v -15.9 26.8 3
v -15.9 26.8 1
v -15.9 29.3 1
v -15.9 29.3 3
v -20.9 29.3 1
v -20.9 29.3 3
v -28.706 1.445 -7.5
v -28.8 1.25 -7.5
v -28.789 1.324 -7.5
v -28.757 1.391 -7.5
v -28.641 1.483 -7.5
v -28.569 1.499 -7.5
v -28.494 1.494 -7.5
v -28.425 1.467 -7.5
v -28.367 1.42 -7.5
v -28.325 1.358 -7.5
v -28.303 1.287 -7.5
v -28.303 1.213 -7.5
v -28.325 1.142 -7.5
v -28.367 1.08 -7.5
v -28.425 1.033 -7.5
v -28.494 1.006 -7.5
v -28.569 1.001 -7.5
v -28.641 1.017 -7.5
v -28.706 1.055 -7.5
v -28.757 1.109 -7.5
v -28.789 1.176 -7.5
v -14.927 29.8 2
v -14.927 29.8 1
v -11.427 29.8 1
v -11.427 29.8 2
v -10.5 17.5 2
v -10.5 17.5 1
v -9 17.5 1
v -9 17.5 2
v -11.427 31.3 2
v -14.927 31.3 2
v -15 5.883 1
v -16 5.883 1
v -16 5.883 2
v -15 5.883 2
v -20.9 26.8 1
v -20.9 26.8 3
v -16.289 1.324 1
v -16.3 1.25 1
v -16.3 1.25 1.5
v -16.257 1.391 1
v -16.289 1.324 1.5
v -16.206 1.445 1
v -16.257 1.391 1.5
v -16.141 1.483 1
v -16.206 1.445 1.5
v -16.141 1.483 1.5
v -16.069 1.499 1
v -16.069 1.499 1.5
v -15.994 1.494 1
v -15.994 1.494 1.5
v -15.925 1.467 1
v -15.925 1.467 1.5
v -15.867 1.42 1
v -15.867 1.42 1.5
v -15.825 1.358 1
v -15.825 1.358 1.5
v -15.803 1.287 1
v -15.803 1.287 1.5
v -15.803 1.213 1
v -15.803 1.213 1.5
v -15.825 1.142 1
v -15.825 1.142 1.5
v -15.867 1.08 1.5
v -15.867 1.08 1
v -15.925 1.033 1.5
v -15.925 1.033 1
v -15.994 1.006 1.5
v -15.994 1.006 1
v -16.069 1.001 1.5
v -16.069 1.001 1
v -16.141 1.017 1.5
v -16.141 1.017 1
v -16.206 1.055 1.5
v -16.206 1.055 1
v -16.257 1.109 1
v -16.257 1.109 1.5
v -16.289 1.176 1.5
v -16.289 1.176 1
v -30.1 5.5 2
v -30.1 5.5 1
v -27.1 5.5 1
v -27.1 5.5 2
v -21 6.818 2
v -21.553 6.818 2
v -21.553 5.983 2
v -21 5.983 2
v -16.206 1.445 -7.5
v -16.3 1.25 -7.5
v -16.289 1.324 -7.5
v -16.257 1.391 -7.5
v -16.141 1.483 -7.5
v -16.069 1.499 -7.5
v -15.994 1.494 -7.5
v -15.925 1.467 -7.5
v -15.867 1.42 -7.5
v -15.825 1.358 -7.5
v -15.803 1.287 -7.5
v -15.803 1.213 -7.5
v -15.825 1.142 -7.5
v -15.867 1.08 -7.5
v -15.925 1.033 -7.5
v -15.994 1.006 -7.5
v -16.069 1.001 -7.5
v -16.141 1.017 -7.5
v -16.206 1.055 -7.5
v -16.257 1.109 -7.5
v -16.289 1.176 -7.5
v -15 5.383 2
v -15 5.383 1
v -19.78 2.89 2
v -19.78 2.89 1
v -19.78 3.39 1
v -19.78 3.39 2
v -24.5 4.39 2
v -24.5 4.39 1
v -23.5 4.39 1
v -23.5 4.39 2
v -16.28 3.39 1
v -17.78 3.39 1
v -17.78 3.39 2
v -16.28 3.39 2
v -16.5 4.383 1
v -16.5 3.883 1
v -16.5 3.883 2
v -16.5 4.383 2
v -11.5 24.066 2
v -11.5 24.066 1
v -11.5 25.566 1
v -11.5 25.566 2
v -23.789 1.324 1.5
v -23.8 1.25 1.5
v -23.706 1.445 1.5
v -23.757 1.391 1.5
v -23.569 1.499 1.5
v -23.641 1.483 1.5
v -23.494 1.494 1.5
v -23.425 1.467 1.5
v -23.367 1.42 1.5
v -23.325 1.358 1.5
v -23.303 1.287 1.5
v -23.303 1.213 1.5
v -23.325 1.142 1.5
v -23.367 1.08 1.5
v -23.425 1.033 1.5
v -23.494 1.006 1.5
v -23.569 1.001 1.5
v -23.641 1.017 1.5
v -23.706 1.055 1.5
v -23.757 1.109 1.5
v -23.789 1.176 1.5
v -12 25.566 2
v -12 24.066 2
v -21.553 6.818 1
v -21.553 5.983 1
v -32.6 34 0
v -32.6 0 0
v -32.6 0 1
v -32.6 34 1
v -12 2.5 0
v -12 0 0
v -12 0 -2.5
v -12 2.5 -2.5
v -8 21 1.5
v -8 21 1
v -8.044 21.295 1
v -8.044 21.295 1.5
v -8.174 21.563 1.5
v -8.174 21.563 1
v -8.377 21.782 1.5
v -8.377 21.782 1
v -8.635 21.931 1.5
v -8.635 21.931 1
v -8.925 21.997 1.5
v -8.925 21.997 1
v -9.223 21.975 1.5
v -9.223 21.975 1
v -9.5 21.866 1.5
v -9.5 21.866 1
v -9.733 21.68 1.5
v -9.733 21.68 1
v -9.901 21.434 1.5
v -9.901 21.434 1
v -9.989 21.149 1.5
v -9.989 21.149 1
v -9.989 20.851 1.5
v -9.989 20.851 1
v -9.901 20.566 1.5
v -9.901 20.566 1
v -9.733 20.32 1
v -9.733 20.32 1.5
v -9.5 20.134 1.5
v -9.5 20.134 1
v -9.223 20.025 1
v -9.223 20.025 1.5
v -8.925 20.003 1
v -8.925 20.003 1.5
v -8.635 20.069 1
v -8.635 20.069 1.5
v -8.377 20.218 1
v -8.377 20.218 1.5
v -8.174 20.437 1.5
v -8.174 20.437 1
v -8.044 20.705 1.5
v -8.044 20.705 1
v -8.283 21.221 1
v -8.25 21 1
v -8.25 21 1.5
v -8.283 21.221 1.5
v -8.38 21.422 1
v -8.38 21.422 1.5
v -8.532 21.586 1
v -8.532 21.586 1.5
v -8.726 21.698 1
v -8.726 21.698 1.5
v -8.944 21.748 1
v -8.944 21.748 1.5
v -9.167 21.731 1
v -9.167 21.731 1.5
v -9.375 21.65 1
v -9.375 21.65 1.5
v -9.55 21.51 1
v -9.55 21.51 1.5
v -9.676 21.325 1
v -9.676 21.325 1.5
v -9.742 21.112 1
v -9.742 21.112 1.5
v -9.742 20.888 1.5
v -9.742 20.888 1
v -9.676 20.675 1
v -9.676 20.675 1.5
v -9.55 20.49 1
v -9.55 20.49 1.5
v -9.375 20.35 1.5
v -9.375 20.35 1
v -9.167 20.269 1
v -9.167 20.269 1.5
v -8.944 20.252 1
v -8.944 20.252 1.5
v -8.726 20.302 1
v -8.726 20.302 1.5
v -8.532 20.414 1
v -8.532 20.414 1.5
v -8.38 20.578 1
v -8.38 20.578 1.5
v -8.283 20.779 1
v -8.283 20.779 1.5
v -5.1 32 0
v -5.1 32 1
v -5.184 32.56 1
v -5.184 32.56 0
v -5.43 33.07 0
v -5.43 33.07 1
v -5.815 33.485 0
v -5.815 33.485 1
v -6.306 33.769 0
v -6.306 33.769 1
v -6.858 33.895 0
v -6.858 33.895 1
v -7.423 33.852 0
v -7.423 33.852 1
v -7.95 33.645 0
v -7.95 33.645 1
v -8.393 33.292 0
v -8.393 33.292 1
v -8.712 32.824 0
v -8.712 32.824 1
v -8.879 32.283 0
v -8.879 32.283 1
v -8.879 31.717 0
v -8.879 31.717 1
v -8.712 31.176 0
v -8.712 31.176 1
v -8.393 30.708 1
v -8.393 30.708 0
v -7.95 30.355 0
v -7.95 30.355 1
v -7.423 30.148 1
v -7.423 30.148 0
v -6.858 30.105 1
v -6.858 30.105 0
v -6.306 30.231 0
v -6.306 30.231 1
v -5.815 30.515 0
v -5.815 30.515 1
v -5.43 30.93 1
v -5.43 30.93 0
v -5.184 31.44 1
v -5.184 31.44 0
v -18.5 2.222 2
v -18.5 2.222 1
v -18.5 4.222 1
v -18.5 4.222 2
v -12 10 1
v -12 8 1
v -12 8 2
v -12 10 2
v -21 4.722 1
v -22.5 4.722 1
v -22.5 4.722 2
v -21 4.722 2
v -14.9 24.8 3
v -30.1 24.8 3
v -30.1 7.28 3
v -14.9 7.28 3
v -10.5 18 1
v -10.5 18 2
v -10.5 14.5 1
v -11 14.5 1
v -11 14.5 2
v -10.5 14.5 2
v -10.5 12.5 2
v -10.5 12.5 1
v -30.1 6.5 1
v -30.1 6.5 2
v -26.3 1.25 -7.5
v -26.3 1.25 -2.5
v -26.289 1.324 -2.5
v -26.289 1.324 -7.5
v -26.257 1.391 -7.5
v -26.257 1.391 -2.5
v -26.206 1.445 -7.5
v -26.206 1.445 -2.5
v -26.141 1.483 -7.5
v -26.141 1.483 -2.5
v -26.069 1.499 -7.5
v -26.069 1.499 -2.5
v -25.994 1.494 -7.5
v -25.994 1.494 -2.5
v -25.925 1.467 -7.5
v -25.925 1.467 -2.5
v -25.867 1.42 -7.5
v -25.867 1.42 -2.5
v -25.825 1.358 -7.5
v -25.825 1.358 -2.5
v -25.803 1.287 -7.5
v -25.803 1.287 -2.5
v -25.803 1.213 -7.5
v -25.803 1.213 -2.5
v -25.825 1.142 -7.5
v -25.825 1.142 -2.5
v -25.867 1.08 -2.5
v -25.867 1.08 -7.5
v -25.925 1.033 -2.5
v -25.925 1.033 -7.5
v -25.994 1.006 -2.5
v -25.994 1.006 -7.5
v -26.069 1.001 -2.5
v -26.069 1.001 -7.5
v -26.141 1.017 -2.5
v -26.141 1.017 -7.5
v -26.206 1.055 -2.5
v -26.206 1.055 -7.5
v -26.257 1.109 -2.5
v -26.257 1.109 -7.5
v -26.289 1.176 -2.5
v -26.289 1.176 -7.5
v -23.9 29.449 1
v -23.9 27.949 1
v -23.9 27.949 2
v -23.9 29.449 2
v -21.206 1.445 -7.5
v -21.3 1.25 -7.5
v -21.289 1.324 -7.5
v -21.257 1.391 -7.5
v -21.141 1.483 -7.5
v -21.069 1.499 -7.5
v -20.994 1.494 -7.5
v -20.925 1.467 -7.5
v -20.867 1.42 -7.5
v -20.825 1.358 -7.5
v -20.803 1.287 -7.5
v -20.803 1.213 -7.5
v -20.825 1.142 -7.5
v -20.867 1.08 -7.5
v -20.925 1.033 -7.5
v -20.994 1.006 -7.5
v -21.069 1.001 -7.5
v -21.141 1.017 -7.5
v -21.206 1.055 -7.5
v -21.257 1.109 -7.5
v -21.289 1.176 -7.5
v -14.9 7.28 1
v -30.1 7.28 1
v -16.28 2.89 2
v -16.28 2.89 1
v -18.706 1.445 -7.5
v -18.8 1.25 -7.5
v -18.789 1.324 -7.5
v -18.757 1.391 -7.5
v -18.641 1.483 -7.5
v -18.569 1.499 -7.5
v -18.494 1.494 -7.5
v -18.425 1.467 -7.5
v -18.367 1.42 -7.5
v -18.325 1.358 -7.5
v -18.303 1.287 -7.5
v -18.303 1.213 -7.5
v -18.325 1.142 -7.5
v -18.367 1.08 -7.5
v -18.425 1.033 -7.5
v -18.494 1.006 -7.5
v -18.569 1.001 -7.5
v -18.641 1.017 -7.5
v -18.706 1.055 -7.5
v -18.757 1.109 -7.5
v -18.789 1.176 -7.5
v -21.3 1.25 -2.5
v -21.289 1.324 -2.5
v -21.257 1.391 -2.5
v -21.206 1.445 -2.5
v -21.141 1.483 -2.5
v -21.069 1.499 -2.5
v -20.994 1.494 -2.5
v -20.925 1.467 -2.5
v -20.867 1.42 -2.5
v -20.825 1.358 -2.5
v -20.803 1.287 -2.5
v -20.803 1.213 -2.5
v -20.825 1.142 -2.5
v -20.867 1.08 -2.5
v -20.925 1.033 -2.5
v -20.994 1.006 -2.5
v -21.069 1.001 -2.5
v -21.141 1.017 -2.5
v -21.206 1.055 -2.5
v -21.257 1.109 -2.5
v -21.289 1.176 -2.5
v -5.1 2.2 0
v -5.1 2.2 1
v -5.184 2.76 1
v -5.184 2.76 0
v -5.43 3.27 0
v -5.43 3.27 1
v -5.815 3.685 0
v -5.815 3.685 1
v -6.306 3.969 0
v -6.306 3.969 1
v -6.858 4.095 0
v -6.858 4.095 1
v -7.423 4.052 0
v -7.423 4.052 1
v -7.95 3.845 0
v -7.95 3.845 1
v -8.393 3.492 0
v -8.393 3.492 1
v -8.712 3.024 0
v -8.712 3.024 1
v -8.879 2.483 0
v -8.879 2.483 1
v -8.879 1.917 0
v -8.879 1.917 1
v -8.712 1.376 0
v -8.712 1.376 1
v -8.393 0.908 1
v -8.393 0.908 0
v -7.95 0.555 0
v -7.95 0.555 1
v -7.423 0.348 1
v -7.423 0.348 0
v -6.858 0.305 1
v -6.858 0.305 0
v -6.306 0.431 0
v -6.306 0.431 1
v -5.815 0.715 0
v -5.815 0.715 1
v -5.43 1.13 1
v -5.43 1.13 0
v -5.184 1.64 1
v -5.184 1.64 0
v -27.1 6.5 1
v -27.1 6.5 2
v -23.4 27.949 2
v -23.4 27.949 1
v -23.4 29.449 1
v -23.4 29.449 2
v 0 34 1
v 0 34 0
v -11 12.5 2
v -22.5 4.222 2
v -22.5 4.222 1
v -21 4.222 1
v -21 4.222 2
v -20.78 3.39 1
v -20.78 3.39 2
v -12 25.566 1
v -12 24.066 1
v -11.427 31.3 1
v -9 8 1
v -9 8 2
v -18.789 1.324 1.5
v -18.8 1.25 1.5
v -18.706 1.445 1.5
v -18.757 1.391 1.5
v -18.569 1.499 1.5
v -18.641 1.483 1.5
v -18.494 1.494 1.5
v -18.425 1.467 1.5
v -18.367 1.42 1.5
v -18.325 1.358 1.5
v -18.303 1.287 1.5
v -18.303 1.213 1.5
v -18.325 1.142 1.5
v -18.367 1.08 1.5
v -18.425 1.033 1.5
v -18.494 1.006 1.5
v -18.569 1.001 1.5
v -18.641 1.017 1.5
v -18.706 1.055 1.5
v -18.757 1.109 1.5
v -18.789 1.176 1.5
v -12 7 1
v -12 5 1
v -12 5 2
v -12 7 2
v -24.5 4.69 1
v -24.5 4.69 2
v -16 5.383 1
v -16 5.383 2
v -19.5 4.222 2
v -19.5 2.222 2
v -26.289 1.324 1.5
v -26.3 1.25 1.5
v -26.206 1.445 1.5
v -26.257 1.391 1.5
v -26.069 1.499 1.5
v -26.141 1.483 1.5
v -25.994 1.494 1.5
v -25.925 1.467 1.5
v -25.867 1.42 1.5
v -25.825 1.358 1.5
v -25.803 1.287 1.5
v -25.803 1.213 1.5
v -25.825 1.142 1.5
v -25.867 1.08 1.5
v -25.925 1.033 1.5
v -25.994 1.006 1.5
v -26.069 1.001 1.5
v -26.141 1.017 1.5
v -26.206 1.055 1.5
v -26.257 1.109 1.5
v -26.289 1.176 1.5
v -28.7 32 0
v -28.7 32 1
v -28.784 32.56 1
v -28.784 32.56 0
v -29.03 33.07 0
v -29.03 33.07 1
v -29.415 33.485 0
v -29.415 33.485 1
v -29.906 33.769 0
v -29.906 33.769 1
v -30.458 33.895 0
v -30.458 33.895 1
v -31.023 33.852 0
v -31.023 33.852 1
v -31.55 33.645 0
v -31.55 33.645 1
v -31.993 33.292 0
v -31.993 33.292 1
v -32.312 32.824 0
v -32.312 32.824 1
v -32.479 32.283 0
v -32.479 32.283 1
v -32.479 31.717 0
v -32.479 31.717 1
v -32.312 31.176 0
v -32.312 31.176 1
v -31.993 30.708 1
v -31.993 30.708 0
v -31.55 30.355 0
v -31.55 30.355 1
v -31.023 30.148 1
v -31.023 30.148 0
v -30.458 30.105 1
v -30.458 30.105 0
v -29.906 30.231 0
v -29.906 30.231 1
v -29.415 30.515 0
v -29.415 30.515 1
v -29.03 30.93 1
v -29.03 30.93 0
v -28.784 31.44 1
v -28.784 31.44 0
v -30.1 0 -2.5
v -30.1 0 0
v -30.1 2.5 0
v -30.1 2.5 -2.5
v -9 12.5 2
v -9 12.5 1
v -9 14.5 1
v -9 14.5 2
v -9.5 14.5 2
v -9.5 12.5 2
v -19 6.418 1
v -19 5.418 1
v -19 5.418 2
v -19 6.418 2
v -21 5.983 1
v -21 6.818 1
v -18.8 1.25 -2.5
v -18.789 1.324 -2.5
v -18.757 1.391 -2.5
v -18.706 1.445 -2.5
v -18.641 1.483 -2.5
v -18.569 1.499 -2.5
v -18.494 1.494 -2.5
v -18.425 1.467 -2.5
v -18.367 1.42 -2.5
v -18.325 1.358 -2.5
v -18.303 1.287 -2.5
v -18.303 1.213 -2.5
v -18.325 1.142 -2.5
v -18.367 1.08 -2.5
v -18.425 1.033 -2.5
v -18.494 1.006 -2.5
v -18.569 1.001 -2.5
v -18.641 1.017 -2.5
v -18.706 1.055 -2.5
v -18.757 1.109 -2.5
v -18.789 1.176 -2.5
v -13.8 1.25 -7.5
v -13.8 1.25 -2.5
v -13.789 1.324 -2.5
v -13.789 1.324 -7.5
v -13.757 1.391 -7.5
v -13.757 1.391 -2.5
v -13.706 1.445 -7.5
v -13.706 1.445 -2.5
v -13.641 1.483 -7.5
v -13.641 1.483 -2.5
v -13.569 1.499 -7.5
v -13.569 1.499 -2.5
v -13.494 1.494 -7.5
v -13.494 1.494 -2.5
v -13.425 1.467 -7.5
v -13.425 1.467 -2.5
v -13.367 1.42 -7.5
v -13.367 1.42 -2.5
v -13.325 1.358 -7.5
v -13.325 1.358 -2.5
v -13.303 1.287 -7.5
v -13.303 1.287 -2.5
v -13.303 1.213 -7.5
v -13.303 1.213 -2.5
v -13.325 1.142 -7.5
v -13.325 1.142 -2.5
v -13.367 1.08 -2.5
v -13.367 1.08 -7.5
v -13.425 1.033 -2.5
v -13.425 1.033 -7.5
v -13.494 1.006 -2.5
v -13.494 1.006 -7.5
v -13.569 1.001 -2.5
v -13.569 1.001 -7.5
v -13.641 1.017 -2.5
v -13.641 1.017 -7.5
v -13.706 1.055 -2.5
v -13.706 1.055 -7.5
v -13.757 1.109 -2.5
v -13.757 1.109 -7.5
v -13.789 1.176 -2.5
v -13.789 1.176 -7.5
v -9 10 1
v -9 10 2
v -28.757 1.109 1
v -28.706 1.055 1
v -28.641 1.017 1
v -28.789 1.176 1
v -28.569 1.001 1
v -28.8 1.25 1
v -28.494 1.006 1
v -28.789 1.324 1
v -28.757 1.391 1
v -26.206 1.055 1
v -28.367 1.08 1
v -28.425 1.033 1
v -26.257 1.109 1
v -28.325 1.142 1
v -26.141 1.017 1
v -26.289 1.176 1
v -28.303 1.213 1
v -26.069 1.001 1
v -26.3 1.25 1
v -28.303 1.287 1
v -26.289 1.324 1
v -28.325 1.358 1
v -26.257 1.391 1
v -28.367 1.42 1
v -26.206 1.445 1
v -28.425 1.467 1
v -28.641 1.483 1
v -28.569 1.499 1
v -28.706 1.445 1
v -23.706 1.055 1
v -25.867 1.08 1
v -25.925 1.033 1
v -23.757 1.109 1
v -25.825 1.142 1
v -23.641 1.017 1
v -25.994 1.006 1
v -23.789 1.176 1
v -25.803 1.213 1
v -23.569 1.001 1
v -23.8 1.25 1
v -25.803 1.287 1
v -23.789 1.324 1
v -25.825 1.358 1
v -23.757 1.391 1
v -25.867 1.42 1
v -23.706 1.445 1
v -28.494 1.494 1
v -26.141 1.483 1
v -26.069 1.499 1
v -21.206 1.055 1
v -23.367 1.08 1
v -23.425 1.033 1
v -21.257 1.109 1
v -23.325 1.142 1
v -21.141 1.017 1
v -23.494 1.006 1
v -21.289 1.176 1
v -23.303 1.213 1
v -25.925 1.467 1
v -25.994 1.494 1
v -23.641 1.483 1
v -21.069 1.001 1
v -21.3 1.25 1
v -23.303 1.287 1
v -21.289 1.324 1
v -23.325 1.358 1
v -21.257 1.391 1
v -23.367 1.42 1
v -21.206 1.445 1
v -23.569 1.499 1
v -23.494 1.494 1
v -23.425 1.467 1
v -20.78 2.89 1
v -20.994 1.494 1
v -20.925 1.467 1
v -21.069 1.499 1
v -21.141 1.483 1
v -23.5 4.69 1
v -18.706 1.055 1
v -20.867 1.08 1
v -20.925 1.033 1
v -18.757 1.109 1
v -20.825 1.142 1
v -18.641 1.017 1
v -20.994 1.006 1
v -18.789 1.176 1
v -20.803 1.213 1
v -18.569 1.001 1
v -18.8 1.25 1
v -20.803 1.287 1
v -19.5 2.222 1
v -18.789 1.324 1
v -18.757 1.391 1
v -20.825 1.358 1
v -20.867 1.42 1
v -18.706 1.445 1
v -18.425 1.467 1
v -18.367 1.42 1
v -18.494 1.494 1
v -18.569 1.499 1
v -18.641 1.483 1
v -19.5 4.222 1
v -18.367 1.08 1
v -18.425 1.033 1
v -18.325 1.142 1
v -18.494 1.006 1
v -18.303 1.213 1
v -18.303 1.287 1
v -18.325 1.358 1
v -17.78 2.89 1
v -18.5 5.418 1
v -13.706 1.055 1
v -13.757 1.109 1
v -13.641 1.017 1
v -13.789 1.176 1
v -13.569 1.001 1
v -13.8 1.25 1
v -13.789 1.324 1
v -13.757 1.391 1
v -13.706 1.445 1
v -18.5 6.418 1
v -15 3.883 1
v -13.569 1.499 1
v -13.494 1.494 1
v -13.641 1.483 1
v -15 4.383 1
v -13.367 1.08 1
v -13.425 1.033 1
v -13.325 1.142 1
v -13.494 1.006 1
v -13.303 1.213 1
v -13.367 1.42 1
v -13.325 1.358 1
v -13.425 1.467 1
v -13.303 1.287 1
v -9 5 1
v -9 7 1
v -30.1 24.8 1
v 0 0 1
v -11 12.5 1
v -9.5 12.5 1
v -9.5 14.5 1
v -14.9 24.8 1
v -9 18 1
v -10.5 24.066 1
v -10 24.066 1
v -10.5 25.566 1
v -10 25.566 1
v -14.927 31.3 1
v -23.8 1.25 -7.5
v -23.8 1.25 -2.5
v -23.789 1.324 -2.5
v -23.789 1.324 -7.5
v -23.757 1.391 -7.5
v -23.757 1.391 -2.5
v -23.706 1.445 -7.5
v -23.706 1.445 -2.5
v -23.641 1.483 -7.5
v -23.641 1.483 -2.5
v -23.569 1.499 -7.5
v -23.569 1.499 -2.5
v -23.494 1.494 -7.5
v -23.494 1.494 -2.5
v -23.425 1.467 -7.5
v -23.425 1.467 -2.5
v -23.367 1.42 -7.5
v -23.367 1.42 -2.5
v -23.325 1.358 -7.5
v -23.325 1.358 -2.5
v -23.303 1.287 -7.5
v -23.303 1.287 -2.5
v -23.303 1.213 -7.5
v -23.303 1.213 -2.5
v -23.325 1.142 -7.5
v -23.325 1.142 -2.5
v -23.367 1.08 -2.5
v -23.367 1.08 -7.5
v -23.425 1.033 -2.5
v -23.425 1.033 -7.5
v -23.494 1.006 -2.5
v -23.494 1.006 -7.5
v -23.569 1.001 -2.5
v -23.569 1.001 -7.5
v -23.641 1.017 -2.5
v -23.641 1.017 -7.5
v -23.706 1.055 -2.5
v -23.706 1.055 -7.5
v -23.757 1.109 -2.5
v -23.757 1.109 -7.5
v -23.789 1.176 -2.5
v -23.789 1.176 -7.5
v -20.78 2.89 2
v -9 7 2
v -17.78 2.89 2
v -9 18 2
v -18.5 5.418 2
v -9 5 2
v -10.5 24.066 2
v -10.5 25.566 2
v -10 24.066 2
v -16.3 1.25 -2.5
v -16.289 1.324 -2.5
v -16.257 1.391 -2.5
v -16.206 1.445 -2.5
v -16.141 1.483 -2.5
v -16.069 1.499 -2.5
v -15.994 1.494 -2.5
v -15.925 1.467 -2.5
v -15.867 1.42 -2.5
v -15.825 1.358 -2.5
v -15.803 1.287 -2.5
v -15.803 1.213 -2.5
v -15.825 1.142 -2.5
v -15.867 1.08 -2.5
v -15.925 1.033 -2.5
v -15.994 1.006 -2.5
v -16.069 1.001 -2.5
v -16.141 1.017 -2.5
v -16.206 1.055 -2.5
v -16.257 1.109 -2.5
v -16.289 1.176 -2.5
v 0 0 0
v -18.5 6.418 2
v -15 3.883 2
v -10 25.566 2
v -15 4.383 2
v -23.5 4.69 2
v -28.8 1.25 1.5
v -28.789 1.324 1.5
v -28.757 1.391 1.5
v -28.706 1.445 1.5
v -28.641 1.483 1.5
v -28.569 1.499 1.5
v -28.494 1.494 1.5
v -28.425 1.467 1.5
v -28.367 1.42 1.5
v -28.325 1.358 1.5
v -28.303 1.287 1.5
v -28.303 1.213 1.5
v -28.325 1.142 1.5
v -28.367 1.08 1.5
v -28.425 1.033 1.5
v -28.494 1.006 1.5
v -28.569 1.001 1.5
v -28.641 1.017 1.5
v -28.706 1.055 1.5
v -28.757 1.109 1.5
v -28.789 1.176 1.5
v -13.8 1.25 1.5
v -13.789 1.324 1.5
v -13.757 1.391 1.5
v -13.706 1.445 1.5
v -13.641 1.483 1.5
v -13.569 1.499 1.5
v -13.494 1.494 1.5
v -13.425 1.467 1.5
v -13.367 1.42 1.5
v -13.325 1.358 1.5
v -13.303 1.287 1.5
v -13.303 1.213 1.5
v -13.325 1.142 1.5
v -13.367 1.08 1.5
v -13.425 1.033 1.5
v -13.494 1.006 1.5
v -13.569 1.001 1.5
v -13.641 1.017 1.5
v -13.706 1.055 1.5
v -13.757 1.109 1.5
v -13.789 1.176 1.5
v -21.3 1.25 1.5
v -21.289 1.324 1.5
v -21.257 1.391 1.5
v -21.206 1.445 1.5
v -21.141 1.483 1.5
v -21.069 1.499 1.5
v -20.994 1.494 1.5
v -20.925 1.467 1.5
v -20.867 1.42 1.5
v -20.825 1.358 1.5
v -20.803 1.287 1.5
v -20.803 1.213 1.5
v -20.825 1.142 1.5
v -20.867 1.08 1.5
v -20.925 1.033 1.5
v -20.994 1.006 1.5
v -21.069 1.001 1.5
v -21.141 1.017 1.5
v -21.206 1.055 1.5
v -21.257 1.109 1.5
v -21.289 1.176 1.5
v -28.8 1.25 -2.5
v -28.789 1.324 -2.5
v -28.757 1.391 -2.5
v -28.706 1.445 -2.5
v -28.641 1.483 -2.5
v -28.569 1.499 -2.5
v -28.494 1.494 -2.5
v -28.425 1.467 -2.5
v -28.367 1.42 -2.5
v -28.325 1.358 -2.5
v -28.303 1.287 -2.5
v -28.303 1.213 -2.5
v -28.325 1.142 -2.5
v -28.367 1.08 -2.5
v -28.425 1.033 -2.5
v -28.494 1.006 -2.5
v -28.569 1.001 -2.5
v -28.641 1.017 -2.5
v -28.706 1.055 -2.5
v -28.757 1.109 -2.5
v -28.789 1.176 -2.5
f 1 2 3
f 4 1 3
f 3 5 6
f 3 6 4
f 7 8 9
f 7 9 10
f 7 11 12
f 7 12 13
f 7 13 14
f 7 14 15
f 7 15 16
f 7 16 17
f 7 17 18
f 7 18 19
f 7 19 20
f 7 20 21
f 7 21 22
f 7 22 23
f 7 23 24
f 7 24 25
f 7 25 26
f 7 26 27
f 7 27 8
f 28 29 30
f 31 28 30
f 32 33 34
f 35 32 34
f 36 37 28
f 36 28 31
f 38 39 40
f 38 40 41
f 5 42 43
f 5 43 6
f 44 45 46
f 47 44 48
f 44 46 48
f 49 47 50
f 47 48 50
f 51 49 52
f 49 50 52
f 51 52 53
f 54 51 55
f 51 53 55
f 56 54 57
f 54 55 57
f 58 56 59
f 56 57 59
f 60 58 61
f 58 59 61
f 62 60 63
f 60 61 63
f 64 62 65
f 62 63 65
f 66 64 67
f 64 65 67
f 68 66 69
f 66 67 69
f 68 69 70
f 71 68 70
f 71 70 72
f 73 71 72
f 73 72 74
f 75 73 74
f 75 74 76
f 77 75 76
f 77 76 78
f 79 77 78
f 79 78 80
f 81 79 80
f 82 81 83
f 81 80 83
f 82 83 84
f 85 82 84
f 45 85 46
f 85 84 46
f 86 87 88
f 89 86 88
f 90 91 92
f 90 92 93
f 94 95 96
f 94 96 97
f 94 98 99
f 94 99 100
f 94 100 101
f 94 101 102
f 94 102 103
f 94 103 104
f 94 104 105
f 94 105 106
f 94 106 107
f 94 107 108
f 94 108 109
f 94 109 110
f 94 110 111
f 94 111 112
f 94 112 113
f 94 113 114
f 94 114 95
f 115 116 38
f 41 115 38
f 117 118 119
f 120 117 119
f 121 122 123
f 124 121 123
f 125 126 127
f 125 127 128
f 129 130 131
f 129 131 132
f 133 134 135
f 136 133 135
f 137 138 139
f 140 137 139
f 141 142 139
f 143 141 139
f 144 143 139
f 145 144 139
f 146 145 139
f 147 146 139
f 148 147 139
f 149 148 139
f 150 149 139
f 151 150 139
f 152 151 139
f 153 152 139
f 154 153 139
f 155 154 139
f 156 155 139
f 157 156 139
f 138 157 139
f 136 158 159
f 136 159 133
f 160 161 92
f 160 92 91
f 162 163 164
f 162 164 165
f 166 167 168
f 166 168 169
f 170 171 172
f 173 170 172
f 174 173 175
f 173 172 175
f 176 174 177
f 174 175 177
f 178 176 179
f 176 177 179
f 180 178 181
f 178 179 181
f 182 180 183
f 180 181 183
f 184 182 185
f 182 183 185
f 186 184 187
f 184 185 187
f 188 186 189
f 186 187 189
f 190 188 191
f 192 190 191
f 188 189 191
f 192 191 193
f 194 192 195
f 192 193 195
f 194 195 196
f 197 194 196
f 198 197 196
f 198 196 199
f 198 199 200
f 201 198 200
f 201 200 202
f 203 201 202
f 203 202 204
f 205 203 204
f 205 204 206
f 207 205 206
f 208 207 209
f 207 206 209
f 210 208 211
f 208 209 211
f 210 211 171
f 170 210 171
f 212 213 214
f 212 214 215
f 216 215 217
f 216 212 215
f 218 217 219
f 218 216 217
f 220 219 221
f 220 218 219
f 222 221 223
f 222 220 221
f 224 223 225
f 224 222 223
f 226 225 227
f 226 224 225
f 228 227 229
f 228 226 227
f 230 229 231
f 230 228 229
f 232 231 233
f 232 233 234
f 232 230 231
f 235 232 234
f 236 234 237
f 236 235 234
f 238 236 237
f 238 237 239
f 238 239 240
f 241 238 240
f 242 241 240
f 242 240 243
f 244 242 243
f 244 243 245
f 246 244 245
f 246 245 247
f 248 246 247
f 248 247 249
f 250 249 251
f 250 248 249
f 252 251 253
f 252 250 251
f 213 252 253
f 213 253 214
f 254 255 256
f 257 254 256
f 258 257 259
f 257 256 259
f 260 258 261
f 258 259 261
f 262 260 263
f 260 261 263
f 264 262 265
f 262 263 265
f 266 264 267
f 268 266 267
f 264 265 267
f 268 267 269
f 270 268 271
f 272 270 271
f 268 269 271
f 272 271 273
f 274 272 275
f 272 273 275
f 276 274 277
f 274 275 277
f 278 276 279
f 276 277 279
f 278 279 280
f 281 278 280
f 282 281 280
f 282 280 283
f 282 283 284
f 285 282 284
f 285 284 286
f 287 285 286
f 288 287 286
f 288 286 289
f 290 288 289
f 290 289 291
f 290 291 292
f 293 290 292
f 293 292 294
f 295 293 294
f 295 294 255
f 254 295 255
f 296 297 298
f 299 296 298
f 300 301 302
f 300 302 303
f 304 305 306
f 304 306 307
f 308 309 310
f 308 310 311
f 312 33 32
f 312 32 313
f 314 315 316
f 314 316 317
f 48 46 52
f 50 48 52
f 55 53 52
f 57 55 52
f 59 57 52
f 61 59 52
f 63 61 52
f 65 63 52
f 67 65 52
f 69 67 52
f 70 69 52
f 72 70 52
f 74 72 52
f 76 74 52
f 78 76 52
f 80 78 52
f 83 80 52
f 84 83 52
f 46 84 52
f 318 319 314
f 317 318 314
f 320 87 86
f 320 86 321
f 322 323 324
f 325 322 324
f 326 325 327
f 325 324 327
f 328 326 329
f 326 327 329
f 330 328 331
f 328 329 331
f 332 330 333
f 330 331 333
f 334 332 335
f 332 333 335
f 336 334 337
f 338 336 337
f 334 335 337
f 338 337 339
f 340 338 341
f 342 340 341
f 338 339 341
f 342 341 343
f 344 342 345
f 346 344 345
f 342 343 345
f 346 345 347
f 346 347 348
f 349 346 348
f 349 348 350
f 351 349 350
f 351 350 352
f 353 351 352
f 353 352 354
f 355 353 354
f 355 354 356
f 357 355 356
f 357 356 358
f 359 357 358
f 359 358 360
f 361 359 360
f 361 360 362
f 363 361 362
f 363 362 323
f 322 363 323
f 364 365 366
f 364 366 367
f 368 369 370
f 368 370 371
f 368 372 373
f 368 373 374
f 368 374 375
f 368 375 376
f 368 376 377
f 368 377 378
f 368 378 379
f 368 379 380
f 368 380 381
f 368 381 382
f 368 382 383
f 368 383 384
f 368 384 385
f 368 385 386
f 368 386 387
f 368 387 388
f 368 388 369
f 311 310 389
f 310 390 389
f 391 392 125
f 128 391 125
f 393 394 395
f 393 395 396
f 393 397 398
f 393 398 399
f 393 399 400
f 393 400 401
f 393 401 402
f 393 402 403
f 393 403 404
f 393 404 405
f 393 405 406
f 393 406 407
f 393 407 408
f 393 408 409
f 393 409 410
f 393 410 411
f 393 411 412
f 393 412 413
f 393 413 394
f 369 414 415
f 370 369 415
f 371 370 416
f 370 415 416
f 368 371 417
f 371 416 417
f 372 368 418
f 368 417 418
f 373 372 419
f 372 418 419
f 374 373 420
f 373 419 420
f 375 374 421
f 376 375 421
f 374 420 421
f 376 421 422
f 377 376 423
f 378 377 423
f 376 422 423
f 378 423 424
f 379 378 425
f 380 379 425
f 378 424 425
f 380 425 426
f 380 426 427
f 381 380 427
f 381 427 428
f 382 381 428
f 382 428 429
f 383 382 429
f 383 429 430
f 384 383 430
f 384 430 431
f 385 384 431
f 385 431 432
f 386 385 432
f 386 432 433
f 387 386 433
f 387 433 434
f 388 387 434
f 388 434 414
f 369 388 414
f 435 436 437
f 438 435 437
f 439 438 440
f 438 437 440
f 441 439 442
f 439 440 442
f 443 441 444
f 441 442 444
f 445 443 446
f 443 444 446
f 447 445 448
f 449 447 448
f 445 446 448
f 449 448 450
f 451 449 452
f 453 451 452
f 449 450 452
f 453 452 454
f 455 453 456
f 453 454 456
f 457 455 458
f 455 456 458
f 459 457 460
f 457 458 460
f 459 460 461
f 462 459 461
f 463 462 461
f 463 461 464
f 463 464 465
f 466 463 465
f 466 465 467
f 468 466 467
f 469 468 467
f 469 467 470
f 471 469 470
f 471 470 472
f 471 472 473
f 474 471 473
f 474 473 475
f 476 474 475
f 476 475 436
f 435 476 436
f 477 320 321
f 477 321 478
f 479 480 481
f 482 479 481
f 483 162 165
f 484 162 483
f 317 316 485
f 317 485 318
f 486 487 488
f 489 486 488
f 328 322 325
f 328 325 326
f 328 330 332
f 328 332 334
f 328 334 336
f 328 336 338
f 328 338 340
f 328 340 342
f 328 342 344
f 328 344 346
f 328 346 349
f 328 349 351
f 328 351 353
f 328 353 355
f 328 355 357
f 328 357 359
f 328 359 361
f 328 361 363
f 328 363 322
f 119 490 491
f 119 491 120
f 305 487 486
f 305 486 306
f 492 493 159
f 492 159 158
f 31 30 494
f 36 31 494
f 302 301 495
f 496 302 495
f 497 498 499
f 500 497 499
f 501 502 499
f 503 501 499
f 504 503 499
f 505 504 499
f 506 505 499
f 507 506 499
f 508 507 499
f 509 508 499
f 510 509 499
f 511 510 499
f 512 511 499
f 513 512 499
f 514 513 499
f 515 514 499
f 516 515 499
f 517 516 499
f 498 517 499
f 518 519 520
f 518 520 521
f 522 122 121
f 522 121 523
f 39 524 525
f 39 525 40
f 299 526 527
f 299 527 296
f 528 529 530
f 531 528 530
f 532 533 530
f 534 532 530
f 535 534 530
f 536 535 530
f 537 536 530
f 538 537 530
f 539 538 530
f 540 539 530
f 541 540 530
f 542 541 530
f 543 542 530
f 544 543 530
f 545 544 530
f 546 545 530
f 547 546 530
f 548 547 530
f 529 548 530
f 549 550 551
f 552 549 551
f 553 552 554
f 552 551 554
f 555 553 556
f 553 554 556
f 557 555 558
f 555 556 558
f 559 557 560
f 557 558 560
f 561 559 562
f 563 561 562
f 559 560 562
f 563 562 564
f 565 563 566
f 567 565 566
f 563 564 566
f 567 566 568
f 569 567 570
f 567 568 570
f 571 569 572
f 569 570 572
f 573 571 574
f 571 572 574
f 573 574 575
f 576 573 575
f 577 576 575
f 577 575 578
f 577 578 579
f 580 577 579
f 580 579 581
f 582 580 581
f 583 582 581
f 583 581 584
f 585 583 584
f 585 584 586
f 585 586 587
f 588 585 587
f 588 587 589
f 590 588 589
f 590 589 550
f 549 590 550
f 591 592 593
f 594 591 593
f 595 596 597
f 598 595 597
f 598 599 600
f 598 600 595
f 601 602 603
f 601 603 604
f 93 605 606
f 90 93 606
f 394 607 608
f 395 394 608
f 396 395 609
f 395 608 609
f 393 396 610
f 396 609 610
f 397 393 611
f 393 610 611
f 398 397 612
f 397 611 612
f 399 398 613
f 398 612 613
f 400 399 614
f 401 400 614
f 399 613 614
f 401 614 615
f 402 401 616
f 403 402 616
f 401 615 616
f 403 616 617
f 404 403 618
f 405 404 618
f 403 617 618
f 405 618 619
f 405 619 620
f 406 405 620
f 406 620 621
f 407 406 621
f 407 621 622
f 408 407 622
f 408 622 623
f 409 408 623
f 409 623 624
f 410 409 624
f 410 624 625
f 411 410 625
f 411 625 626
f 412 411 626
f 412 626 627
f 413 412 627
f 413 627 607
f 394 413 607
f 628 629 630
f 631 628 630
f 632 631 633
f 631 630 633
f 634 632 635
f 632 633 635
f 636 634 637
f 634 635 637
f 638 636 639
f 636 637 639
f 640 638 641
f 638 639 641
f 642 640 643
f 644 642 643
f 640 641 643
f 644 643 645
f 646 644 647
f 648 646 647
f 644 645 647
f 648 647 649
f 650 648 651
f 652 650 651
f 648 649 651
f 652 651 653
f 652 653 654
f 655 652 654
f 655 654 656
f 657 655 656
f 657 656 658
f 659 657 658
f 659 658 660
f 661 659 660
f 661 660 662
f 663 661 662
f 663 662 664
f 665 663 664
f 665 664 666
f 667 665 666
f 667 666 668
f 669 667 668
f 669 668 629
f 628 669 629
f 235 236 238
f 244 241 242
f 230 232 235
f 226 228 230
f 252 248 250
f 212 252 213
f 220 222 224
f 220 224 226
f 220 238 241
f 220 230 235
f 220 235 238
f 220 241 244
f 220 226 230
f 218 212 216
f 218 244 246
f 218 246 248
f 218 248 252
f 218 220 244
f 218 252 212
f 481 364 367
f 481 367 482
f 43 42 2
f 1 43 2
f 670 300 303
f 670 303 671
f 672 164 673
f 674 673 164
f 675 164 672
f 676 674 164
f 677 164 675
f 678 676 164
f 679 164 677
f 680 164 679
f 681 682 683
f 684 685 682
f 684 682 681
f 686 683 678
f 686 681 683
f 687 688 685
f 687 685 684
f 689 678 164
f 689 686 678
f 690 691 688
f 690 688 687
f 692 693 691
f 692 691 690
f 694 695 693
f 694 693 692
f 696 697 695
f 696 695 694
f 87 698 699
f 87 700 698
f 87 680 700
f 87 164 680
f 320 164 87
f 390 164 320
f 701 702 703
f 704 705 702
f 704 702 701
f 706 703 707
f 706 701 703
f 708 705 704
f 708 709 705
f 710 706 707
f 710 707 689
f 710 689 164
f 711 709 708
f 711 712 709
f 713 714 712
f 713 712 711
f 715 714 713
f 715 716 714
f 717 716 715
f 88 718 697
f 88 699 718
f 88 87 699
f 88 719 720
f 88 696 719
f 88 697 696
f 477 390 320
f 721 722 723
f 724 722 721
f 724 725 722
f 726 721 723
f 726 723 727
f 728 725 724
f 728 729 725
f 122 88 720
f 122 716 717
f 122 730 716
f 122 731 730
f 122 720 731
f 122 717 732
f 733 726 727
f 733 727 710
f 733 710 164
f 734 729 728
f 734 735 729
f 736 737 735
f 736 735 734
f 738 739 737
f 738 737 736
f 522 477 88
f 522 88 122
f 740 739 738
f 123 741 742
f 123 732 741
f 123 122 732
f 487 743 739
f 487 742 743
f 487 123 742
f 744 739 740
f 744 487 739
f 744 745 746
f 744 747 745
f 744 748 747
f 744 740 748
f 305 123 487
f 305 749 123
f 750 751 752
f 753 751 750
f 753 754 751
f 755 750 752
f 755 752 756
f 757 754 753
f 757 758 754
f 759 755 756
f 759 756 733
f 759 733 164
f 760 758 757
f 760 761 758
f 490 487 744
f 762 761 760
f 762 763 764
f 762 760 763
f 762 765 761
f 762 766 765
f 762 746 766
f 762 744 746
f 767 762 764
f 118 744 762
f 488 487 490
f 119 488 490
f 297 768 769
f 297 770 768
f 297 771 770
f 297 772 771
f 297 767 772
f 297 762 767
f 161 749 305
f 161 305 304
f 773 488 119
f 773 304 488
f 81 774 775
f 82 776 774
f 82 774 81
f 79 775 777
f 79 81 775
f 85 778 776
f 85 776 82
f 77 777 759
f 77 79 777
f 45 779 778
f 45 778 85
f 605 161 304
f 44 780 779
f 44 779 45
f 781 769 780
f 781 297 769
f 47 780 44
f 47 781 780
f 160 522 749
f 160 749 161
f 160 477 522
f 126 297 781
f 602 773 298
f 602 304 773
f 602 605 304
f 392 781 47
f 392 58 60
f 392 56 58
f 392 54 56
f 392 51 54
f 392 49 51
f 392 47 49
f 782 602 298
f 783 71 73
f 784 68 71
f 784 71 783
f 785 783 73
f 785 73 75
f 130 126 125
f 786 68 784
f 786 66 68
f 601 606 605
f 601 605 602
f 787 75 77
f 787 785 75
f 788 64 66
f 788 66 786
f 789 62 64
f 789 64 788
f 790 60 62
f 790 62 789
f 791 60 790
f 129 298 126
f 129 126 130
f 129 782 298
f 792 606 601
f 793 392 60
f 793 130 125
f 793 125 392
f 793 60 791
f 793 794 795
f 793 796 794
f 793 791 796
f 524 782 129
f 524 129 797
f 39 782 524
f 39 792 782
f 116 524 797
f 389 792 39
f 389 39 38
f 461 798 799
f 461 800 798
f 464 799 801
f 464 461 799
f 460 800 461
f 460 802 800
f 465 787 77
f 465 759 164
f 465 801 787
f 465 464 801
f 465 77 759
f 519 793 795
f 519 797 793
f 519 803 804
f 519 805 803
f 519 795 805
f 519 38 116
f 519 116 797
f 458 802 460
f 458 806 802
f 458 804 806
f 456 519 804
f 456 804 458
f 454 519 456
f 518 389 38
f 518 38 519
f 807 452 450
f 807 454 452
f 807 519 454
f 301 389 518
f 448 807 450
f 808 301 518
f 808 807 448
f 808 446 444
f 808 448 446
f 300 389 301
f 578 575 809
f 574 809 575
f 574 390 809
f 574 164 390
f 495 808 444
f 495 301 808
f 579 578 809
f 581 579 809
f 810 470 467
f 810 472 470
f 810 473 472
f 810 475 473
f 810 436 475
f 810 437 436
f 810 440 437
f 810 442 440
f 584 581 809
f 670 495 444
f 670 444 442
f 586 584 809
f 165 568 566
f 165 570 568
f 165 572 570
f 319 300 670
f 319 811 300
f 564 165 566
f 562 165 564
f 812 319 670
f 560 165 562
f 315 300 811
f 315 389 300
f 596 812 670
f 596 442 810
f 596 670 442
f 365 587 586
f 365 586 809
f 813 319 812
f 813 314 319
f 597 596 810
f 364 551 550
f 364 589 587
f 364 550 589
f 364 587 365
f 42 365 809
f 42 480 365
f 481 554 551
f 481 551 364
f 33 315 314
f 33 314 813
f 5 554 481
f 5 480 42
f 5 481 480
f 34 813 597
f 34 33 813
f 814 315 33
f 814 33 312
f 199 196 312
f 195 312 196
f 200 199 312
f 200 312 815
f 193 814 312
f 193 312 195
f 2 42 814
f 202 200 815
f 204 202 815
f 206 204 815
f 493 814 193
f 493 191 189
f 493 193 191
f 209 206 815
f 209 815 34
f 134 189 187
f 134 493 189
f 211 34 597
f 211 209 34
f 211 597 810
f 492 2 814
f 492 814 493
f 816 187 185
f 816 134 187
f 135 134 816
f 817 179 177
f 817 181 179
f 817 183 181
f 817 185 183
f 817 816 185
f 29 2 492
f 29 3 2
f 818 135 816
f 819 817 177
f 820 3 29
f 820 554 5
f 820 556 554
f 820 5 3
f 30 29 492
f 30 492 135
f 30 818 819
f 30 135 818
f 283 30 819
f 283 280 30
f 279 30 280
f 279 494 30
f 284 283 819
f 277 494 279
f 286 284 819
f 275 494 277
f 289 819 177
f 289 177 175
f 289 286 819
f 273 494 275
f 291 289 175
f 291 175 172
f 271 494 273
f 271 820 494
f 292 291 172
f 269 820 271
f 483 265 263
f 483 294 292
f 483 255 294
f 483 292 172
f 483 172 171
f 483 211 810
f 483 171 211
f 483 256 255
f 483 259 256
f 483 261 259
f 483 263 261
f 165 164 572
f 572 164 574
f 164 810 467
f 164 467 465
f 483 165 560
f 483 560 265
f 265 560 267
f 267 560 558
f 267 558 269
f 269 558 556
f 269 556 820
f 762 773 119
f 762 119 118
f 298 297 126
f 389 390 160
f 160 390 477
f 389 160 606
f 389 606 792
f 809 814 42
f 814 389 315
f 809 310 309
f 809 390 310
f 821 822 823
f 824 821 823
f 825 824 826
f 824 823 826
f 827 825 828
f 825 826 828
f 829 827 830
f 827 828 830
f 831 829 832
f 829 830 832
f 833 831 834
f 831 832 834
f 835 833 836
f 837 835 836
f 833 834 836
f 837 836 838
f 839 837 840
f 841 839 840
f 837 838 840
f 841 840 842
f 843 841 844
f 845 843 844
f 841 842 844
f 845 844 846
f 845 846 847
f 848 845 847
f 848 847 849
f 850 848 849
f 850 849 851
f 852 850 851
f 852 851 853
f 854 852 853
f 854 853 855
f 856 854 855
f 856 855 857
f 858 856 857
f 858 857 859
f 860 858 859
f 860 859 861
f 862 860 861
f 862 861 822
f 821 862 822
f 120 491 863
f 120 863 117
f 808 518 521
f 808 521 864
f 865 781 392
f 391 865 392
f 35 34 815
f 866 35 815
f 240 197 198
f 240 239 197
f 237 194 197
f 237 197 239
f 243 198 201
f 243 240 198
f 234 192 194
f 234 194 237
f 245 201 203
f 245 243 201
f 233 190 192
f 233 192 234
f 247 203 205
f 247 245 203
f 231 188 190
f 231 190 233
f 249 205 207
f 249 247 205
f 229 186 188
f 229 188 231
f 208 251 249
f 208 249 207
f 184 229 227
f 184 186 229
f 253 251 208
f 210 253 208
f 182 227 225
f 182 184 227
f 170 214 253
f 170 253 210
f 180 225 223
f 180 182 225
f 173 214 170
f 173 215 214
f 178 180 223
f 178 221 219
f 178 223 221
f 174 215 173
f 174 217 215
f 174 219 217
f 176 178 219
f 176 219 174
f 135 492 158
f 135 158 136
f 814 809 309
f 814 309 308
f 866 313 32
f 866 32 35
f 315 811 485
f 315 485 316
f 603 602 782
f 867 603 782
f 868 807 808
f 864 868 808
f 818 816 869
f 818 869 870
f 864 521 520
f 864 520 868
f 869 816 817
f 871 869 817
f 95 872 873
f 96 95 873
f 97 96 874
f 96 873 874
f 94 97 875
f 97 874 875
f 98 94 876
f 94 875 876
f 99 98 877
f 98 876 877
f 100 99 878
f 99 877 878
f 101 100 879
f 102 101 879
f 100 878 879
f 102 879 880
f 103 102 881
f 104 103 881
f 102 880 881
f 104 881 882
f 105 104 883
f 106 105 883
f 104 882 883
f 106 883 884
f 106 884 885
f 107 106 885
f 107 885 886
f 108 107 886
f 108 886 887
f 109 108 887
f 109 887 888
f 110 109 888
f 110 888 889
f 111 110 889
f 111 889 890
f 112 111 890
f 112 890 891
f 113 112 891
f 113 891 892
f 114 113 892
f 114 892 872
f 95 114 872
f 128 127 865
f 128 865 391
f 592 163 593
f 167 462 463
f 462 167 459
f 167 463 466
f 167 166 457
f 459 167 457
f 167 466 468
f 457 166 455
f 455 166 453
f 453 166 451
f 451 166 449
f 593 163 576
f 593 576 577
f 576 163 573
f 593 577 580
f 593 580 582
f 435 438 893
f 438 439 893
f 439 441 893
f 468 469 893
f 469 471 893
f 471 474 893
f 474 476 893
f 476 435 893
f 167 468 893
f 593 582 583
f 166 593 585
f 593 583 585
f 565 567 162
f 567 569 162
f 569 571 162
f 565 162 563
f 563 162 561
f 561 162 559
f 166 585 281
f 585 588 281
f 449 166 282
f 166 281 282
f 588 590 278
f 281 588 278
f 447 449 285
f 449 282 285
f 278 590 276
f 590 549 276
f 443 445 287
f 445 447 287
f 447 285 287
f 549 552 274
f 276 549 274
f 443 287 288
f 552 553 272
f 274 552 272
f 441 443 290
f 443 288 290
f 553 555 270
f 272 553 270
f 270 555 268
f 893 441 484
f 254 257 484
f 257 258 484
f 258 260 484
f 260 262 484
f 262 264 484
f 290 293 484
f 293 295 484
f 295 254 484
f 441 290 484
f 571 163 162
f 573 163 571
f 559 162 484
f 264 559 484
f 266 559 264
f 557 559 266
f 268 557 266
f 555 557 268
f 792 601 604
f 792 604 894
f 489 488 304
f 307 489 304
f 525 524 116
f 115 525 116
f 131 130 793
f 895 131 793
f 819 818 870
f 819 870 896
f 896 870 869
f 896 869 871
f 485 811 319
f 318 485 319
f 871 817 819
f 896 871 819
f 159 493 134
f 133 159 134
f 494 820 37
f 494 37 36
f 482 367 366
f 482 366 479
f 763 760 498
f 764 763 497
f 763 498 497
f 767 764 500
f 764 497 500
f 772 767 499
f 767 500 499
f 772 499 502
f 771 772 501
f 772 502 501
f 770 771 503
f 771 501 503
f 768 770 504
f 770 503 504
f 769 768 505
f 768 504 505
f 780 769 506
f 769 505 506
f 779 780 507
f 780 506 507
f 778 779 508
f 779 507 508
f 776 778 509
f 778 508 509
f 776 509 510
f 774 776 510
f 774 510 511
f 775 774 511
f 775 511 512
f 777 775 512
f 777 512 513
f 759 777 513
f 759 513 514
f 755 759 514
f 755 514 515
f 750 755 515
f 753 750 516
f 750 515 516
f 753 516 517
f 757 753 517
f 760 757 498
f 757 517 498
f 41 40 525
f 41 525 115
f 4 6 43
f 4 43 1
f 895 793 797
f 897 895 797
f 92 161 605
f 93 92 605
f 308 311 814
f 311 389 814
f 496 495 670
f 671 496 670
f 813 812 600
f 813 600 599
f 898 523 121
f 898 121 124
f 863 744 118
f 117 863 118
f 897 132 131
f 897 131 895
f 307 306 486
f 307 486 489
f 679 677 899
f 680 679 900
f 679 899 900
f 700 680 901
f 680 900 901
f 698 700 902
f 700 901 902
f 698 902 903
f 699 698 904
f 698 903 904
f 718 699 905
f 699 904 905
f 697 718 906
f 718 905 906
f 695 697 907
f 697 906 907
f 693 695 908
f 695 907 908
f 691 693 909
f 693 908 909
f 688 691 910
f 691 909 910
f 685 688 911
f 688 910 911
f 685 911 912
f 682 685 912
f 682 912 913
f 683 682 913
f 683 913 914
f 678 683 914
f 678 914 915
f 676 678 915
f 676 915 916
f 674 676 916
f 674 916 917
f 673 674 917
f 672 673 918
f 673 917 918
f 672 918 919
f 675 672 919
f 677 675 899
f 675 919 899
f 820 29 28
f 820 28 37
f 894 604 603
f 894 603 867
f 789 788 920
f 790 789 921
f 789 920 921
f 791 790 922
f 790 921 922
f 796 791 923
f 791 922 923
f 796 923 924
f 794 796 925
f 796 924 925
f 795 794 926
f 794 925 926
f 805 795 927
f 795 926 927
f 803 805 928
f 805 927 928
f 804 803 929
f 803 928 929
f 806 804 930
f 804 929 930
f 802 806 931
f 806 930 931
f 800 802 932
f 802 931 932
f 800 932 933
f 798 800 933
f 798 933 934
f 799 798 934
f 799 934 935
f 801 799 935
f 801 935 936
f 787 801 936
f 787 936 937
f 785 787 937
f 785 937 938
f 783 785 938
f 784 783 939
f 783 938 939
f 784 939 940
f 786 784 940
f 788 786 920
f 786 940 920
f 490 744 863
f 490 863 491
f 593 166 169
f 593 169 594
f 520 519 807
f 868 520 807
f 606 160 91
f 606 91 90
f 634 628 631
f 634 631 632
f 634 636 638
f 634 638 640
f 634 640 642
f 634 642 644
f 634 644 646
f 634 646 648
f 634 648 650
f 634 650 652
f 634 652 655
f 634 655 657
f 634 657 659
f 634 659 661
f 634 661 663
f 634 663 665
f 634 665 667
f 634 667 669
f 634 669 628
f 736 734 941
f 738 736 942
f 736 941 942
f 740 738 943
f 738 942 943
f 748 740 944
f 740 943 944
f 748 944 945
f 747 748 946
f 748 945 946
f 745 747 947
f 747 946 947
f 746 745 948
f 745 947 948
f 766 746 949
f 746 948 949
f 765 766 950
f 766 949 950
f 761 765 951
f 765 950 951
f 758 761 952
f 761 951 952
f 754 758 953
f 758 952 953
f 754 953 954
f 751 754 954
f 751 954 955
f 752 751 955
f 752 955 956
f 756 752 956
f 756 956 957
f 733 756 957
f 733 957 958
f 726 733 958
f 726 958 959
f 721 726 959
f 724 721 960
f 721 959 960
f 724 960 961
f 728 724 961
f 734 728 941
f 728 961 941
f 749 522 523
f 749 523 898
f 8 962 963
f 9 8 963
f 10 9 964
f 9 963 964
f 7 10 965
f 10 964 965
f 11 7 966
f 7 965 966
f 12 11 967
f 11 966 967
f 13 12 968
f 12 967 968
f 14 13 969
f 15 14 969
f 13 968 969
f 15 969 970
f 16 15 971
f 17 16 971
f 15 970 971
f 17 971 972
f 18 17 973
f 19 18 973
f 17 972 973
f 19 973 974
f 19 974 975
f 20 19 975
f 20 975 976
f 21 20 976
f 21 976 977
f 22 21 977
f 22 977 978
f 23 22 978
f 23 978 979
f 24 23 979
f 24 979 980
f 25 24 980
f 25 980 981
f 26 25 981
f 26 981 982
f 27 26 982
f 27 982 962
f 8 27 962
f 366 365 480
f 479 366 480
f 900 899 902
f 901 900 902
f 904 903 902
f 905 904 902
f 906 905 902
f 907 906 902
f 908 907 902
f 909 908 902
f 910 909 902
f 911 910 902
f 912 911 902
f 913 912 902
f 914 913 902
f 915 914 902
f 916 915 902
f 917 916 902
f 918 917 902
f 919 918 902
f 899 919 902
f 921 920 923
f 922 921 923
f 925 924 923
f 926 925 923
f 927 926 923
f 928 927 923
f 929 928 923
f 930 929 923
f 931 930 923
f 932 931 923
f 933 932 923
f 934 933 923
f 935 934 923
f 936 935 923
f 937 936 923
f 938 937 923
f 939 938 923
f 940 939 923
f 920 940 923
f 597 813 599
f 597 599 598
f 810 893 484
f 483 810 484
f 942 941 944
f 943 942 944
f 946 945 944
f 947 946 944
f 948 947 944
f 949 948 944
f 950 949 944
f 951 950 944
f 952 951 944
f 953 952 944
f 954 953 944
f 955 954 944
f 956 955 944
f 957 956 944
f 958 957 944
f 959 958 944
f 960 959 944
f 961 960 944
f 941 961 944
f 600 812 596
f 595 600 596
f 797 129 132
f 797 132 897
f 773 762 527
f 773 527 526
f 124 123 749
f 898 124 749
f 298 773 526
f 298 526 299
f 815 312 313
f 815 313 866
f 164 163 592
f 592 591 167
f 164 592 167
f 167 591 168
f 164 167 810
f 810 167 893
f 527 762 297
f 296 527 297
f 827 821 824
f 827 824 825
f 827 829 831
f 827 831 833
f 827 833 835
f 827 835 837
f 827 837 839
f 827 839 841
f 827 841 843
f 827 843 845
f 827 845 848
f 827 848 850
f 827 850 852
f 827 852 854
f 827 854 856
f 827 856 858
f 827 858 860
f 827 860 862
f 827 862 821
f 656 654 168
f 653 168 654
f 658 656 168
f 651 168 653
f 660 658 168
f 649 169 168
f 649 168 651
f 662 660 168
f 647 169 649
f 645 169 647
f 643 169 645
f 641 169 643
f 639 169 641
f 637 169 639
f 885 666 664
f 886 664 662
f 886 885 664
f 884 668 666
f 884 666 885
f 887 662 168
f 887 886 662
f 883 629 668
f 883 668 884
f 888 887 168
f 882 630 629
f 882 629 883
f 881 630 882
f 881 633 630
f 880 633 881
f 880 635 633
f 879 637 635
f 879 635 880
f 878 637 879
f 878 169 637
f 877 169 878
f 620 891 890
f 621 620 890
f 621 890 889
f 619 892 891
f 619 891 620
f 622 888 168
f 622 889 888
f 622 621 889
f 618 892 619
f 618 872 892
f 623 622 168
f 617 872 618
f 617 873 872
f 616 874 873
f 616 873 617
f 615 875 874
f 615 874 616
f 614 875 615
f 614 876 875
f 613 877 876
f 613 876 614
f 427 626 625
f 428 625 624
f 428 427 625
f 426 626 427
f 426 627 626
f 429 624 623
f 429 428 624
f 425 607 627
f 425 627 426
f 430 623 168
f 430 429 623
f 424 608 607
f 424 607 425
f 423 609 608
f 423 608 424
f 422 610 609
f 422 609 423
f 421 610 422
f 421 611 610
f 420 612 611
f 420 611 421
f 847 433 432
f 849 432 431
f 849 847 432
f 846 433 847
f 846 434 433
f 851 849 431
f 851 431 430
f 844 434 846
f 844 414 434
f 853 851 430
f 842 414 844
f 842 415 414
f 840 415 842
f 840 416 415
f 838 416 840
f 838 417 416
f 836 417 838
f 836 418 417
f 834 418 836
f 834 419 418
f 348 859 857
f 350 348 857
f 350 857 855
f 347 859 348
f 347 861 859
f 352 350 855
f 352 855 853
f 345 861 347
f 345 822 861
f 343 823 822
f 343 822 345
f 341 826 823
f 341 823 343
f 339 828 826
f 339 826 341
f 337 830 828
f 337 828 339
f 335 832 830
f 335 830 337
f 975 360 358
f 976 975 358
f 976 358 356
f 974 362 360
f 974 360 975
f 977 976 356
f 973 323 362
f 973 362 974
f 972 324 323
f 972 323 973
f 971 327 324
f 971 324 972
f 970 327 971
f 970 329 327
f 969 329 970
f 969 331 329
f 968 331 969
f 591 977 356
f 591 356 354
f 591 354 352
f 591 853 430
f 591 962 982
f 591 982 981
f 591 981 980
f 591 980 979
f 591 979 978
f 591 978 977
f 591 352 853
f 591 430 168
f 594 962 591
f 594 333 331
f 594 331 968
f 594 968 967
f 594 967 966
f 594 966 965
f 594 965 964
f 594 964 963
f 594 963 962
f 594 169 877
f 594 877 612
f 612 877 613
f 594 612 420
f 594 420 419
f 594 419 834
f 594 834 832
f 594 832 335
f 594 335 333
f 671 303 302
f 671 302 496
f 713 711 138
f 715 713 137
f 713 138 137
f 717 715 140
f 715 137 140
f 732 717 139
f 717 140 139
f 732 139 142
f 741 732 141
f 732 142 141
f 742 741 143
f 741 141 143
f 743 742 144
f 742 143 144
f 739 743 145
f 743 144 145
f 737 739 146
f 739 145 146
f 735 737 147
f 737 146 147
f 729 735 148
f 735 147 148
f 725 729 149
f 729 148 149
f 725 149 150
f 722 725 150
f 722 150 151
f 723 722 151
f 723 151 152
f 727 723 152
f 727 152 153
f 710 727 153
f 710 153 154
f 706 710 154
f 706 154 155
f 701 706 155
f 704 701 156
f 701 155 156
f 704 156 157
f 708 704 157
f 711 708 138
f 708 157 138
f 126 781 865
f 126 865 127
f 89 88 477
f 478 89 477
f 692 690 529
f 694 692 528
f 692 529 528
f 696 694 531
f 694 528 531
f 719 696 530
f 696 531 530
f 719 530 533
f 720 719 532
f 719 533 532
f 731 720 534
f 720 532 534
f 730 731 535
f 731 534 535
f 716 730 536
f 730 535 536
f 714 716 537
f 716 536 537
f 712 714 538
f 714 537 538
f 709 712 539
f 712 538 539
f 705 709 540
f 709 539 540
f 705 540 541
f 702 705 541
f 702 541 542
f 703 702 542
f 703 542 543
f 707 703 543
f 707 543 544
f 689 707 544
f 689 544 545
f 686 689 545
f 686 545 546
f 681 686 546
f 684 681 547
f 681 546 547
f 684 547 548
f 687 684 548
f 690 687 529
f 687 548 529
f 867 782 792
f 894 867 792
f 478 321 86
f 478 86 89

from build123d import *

# Parameters (mm, degrees)
ESQUISSE1_W             = 32.6
ESQUISSE1_H             = 34
BOSS_EXTRU_1_DEPTH      = 1
ESQUISSE2_W             = 5
ESQUISSE2_H             = 2.5
ESQUISSE2_W_2           = 15.2
ESQUISSE2_H_2           = 17.52
ESQUISSE2_W_3           = 3
ESQUISSE2_H_3           = 1
ESQUISSE2_H_4           = 2
BOSS_EXTRU_2_DEPTH      = 1
ESQUISSE3_W             = 15.2
ESQUISSE3_H             = 17.52
ESQUISSE3_W_2           = 5
ESQUISSE3_H_2           = 2.5
BOSS_EXTRU_3_DEPTH      = 1
ESQUISSE4_W             = 0.5
ESQUISSE4_H             = 2
ESQUISSE4_W_2           = 1.5
ESQUISSE4_H_2           = 0.5
ESQUISSE4_H_3           = 1.5
ESQUISSE4_W_3           = 3.5
ESQUISSE4_W_4           = 1
ESQUISSE4_H_4           = 1
ESQUISSE4_H_5           = 0.3
ESQUISSE4_W_5           = 0.553112931
ESQUISSE4_H_6           = 0.835313405
BOSS_EXTRU_4_DEPTH      = 1
ESQUISSE5_R             = 1
ESQUISSE5_R_2           = 0.75
BOSS_EXTRU_5_DEPTH      = 0.5
ESQUISSE6_R             = 1.9
ENL_V_MAT_EXTRU_1_DEPTH = 8.5
ESQUISSE7_W             = 18.1
ESQUISSE7_H             = 2.5
BOSS_EXTRU_6_DEPTH      = 2.5
BOSS_EXTRU_7_DEPTH      = 5
BOSS_EXTRU_7_DEPTH_BACK = 4
ESQUISSE8_R             = 0.25


with BuildPart() as part:
    # Esquisse1 → Boss.-Extru.1 (new body)
    with BuildSketch(Plane.XY):
        with Locations((-16.3, 17)):
            Rectangle(ESQUISSE1_W, ESQUISSE1_H)
    extrude(amount=BOSS_EXTRU_1_DEPTH)

    # Esquisse2 → Boss.-Extru.2 (add)
    with BuildSketch(Plane.XY.offset(1)):
        with Locations((-18.4, 28.05)):
            Rectangle(ESQUISSE2_W, ESQUISSE2_H)
        with Locations((-22.5, 16.04)):
            Rectangle(ESQUISSE2_W_2, ESQUISSE2_H_2)
        with Locations((-28.6, 6)):
            Rectangle(ESQUISSE2_W_3, ESQUISSE2_H_3)
        with Locations((-10.5, 9)):
            Rectangle(ESQUISSE2_W_3, ESQUISSE2_H_4)
        with Locations((-10.5, 6)):
            Rectangle(ESQUISSE2_W_3, ESQUISSE2_H_4)
    extrude(amount=BOSS_EXTRU_2_DEPTH)

    # Esquisse3 → Boss.-Extru.3 (add)
    with BuildSketch(Plane.XY.offset(2)):
        with Locations((-22.5, 16.04)):
            Rectangle(ESQUISSE3_W, ESQUISSE3_H)
        with Locations((-18.4, 28.05)):
            Rectangle(ESQUISSE3_W_2, ESQUISSE3_H_2)
    extrude(amount=BOSS_EXTRU_3_DEPTH)

    # Esquisse4 → Boss.-Extru.4 (add)
    with BuildSketch(Plane.XY.offset(1)):
        with Locations((-9.25, 13.5)):
            Rectangle(ESQUISSE4_W, ESQUISSE4_H)
        with Locations((-10.75, 13.5)):
            Rectangle(ESQUISSE4_W, ESQUISSE4_H)
        with Locations((-9.75, 17.75)):
            Rectangle(ESQUISSE4_W_2, ESQUISSE4_H_2)
        with Locations((-10.25, 24.816299889)):
            Rectangle(ESQUISSE4_W, ESQUISSE4_H_3)
        with Locations((-11.75, 24.816299889)):
            Rectangle(ESQUISSE4_W, ESQUISSE4_H_3)
        with Locations((-13.17709205, 30.55)):
            Rectangle(ESQUISSE4_W_3, ESQUISSE4_H_3)
        with Locations((-23.65, 28.699378422)):
            Rectangle(ESQUISSE4_W, ESQUISSE4_H_3)
        with Locations((-15.5, 5.633321931)):
            Rectangle(ESQUISSE4_W_4, ESQUISSE4_H_2)
        with Locations((-15.75, 4.133321931)):
            Rectangle(ESQUISSE4_W_2, ESQUISSE4_H_2)
        with Locations((-19, 3.221962501)):
            Rectangle(ESQUISSE4_W_4, ESQUISSE4_H)
        with Locations((-18.75, 5.918492514)):
            Rectangle(ESQUISSE4_W, ESQUISSE4_H_4)
        with Locations((-17.030226104, 3.13997626)):
            Rectangle(ESQUISSE4_W_2, ESQUISSE4_H_2)
        with Locations((-20.280226104, 3.13997626)):
            Rectangle(ESQUISSE4_W_4, ESQUISSE4_H_2)
        with Locations((-21.75, 4.471962501)):
            Rectangle(ESQUISSE4_W_2, ESQUISSE4_H_2)
        with Locations((-24, 4.53997626)):
            Rectangle(ESQUISSE4_W_4, ESQUISSE4_H_5)
        with Locations((-21.276556466, 6.400550167)):
            Rectangle(ESQUISSE4_W_5, ESQUISSE4_H_6)
    extrude(amount=BOSS_EXTRU_4_DEPTH)

    # Esquisse5 → Boss.-Extru.5 (add)
    with BuildSketch(Plane.XY.offset(1)):
        with Locations((-9, 21)):
            Circle(ESQUISSE5_R)
        with Locations((-9, 21)):
            Circle(ESQUISSE5_R_2, mode=Mode.SUBTRACT)
    extrude(amount=BOSS_EXTRU_5_DEPTH)

    # Esquisse6 → Enlèv. mat.-Extru.1 (cut)
    with BuildSketch(Plane.XY.offset(1)):
        with Locations((-30.6, 32)):
            Circle(ESQUISSE6_R)
        with Locations((-7, 32)):
            Circle(ESQUISSE6_R)
        with Locations((-7, 2.2)):
            Circle(ESQUISSE6_R)
    extrude(amount=-ENL_V_MAT_EXTRU_1_DEPTH, mode=Mode.SUBTRACT)

    # Esquisse7 → Boss.-Extru.6 (add)
    with BuildSketch(Plane(origin=(0, 0, 0), x_dir=(-1, 0, 0), z_dir=(0, 0, -1))):
        with Locations((21.05, 1.25)):
            Rectangle(ESQUISSE7_W, ESQUISSE7_H)
    extrude(amount=BOSS_EXTRU_6_DEPTH)

    # Esquisse8 → Boss.-Extru.7 (add, two sides: drawn at the far end of the back side and taken through both)
    with BuildSketch(Plane(origin=(0, 0, -2.5), x_dir=(-1, 0, 0), z_dir=(0, 0, -1)).offset(-BOSS_EXTRU_7_DEPTH_BACK)):
        with Locations((13.55, 1.25)):
            Circle(ESQUISSE8_R)
        with Locations((16.05, 1.25)):
            Circle(ESQUISSE8_R)
        with Locations((18.55, 1.25)):
            Circle(ESQUISSE8_R)
        with Locations((21.05, 1.25)):
            Circle(ESQUISSE8_R)
        with Locations((23.55, 1.25)):
            Circle(ESQUISSE8_R)
        with Locations((26.05, 1.25)):
            Circle(ESQUISSE8_R)
        with Locations((28.55, 1.25)):
            Circle(ESQUISSE8_R)
    extrude(amount=BOSS_EXTRU_7_DEPTH + BOSS_EXTRU_7_DEPTH_BACK)


solid = part.part
